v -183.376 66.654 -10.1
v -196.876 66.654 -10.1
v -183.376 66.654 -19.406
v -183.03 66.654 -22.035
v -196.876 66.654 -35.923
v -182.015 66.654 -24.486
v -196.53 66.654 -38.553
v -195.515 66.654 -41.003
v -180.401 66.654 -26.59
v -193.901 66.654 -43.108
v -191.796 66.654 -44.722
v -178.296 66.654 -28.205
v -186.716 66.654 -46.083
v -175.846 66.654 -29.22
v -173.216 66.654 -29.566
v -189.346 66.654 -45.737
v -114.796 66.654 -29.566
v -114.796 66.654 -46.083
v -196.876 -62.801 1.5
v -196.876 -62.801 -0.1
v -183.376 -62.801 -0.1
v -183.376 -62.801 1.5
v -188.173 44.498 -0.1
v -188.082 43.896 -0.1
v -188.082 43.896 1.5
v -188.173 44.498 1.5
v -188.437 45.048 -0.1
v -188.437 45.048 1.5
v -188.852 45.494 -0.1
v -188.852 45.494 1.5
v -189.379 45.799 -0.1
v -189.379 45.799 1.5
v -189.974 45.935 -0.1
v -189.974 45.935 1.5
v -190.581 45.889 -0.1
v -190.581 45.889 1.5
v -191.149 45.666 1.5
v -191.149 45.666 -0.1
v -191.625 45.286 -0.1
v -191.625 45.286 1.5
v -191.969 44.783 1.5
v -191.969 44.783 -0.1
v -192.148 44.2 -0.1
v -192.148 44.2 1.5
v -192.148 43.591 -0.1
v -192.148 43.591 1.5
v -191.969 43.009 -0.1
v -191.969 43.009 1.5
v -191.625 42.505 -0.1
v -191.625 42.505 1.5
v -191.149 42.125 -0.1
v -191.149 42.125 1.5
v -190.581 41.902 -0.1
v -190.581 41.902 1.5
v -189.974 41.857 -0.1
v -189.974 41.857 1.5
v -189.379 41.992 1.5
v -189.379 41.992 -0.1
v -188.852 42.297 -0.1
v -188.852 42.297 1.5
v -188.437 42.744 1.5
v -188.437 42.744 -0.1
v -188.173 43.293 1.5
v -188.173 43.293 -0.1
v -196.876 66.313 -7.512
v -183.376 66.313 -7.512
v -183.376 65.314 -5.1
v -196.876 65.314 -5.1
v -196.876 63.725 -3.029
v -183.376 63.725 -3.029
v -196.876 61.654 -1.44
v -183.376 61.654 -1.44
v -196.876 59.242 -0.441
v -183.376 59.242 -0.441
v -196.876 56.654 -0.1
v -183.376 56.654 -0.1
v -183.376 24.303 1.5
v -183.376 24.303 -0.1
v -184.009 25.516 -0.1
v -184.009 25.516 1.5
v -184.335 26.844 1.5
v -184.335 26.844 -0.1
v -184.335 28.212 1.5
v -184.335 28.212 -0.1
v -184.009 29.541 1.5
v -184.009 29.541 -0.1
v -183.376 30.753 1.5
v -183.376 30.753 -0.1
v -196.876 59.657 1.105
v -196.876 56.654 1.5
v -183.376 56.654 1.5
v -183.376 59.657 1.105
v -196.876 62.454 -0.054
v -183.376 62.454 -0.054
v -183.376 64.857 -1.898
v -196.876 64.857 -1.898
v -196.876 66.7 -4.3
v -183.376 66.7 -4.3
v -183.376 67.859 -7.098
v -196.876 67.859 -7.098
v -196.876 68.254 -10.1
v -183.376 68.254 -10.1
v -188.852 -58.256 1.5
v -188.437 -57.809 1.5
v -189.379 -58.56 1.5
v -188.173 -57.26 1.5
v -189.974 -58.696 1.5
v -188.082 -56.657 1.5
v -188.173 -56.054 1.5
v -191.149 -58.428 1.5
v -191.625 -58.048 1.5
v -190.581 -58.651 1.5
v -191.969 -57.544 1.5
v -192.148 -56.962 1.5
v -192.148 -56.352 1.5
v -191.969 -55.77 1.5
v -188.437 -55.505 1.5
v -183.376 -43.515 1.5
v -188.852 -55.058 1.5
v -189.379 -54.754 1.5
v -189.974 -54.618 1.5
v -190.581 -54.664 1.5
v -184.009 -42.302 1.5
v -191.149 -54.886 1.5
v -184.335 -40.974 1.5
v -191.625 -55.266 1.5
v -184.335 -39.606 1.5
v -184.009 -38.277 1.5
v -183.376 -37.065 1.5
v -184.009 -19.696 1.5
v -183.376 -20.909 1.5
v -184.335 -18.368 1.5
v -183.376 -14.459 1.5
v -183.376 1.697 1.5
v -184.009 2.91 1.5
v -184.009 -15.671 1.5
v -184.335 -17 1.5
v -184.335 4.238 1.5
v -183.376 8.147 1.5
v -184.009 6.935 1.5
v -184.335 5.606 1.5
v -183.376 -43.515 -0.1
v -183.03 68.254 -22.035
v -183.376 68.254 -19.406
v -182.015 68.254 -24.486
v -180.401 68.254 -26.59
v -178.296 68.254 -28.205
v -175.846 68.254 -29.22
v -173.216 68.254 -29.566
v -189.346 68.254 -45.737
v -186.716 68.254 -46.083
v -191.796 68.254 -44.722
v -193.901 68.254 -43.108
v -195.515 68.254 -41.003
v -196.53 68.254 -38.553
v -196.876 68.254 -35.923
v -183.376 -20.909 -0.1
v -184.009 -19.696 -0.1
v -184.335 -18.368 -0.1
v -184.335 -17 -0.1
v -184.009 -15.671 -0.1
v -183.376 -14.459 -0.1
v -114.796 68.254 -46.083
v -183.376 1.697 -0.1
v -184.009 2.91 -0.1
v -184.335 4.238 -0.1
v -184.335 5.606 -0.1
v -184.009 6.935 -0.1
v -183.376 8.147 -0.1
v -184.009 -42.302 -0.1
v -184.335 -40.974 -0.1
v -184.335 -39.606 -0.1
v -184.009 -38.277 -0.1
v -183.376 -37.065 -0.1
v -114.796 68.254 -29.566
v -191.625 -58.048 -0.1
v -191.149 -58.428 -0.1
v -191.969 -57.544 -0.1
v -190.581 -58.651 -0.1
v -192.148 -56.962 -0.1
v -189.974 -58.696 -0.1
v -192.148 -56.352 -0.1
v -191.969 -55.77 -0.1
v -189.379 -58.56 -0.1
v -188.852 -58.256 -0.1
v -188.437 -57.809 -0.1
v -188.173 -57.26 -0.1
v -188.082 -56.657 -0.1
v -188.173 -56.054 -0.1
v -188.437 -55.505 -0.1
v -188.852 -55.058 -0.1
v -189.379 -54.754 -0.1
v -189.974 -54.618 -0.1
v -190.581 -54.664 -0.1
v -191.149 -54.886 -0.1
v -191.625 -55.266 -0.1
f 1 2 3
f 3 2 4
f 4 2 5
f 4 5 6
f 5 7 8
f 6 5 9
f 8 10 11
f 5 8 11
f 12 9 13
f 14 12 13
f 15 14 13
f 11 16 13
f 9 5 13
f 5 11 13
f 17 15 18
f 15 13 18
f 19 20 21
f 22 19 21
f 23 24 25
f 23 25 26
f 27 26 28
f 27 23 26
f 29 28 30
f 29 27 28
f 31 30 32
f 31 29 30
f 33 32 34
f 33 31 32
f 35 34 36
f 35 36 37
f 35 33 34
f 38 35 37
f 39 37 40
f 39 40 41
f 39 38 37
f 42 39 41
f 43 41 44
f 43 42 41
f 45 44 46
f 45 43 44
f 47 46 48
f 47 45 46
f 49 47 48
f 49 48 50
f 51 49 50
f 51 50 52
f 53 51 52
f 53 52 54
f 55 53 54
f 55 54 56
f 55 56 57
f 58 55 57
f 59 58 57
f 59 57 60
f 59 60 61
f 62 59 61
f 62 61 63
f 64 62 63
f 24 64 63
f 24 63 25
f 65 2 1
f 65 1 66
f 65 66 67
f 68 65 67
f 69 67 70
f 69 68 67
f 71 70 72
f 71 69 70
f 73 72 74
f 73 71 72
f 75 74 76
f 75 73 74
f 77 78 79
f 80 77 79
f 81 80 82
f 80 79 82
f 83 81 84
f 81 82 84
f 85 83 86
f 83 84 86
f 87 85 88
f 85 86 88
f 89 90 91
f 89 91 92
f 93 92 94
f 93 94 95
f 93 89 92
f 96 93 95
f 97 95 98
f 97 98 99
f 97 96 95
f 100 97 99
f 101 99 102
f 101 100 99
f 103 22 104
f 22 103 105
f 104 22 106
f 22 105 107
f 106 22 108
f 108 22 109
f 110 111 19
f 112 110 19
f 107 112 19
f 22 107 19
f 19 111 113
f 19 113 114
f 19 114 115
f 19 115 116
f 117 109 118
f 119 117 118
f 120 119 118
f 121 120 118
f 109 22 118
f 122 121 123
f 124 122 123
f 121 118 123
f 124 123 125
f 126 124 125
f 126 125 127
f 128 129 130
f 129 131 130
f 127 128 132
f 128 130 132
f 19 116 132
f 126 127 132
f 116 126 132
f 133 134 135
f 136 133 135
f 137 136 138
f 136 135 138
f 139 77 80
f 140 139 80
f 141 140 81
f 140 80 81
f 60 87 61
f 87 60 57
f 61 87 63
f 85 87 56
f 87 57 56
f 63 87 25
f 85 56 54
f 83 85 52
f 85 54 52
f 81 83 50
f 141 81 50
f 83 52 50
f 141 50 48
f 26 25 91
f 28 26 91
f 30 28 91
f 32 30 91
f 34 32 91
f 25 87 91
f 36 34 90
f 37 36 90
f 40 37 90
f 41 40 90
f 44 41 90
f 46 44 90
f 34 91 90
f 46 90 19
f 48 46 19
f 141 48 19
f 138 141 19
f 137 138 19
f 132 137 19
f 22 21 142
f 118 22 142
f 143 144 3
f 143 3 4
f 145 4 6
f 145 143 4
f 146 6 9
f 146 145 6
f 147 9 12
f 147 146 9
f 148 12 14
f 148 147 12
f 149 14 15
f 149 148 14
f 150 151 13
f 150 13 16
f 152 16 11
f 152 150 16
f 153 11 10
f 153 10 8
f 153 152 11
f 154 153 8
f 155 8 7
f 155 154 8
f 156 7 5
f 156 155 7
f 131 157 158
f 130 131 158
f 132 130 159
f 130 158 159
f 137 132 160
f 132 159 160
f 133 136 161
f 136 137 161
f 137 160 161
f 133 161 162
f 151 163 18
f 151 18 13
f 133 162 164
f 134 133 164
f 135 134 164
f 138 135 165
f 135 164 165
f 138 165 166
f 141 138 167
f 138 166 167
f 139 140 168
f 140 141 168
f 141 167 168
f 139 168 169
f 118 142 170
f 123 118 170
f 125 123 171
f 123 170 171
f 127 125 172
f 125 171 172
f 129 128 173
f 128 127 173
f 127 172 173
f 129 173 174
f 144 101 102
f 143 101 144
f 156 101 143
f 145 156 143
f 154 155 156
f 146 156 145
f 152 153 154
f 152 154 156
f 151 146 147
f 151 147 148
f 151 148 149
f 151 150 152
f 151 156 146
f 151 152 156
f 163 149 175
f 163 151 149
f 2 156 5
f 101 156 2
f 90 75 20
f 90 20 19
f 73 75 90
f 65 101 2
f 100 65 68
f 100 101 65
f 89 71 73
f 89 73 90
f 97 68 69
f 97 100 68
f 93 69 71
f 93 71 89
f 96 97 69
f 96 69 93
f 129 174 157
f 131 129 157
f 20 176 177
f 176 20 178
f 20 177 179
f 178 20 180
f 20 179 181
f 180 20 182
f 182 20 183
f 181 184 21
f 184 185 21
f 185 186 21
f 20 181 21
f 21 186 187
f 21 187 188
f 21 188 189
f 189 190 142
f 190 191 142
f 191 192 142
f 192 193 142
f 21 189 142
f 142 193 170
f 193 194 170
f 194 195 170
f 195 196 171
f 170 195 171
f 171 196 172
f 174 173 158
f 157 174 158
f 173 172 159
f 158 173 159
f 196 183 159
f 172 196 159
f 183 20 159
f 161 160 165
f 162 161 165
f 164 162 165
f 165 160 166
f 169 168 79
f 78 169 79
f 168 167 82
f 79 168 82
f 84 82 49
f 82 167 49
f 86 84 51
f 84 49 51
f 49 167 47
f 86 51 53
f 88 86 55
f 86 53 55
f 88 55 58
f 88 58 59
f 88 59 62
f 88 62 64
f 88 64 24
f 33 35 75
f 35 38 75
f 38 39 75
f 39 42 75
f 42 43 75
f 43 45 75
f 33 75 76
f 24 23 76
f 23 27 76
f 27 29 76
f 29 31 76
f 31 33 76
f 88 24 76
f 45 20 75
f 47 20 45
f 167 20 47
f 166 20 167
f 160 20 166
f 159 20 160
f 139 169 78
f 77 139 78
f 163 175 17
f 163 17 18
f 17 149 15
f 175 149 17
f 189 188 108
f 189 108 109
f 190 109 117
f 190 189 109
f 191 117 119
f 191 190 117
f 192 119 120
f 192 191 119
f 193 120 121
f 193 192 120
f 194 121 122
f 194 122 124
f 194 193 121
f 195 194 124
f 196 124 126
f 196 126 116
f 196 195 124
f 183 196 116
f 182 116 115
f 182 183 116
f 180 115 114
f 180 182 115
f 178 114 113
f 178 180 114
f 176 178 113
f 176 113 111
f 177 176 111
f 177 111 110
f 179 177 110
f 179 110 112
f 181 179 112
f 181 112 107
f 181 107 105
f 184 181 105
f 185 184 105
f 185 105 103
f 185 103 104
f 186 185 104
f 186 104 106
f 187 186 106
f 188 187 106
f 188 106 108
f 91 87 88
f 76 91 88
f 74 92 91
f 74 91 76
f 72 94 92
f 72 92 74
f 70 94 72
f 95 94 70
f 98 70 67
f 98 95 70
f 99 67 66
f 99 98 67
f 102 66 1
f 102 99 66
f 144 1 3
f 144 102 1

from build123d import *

# Parameters (mm, degrees)
SKETCH1_R                    = 2.0447
BOSS_EXTRUDE1_DEPTH          = 1.5
CONVERT_SOLID1_START         = -0.100000102
CONVERT_SOLID1_OUTLINE_R     = 2.0447
CONVERT_SOLID1_DEPTH         = 0.100000102
EDGE_FLANGE1_STRIP_W         = 26.400000408
EDGE_FLANGE1_STRIP_H         = 1.600000102
EDGE_FLANGE1_STRIP_CUT_DEPTH = 13.5
EDGE_FLANGE1_DEPTH           = 13.5
EDGE_FLANGE1_FLAT_DEPTH      = 1.600000102
CUT_EXTRUDE1_DEPTH           = 241.95509557
CUT_EXTRUDE1_DEPTH_BACK      = 3.81
SKETCH14_R                   = 6.583720687


# Read off the part's stored shape, not the designer's step: Convert-Solid1
# Sheet-metal steps are written as plain solids
with BuildPart() as part:
    # Sketch1 → Boss-Extrude1 (new body)
    with BuildSketch(Plane.XY):
        with BuildLine():
            Line((-183.376451986, -43.514598677), (-183.376451986, -62.800541688))
            Line((-183.376451986, -62.800541688), (-196.876451986, -62.800541688))
            Line((-196.876451986, -62.800541688), (-196.876451986, 68.254211442))
            Line((-196.876451986, 68.254211442), (-183.376451986, 68.254211442))
            Line((-183.376451986, 68.254211442), (-183.376451986, 47.120607659))
            Line((-183.376451986, 47.120607659), (-183.376451986, 40.670801349))
            Line((-183.376451986, 40.670801349), (-183.376451986, 30.753207577))
            ThreePointArc((-183.376451986, 30.753207577), (-184.376452018, 27.528304422), (-183.376451986, 24.303401267))
            Line((-183.376451986, 24.303401267), (-183.376451986, 8.147207521))
            ThreePointArc((-183.376451986, 8.147207521), (-184.376451986, 4.922304422), (-183.376451986, 1.697401323))
            Line((-183.376451986, 1.697401323), (-183.376451986, -14.458792479))
            ThreePointArc((-183.376451986, -14.458792479), (-184.376451986, -17.683695578), (-183.376451986, -20.908598677))
            Line((-183.376451986, -20.908598677), (-183.376451986, -37.064792479))
            ThreePointArc((-183.376451986, -37.064792479), (-184.376451986, -40.289695578), (-183.376451986, -43.514598677))
        make_face()
        with Locations((-190.126451986, -56.65709566)):
            Circle(SKETCH1_R, mode=Mode.SUBTRACT)
        with Locations((-190.126451986, 43.895704504)):
            Circle(SKETCH1_R, mode=Mode.SUBTRACT)
    extrude(amount=BOSS_EXTRUDE1_DEPTH)

    # Convert-Solid1 outline → Convert-Solid1 (add)
    with BuildSketch(Plane.XY.offset(CONVERT_SOLID1_START)):
        with BuildLine():
            Line((-183.376451986, -62.800541688), (-183.376451986, -43.514598677))
            ThreePointArc((-183.376451986, -43.514598677), (-184.376451986, -40.289695578), (-183.376451986, -37.064792479))
            Line((-183.376451986, -37.064792479), (-183.376451986, -20.908598677))
            ThreePointArc((-183.376451986, -20.908598677), (-184.376451986, -17.683695578), (-183.376451986, -14.458792479))
            Line((-183.376451986, -14.458792479), (-183.376451986, 1.697401323))
            ThreePointArc((-183.376451986, 1.697401323), (-184.376451986, 4.922304422), (-183.376451986, 8.147207521))
            Line((-183.376451986, 8.147207521), (-183.376451986, 24.303401267))
            ThreePointArc((-183.376451986, 24.303401267), (-184.376452018, 27.528304422), (-183.376451986, 30.753207577))
            Line((-183.376451986, 30.753207577), (-183.376451986, 68.254211442))
            Line((-183.376451986, 68.254211442), (-196.876451986, 68.254211442))
            Line((-196.876451986, 68.254211442), (-196.876451986, -62.800541688))
            Line((-196.876451986, -62.800541688), (-183.376451986, -62.800541688))
        make_face()
        with Locations((-190.126451986, -56.65709566)):
            Circle(CONVERT_SOLID1_OUTLINE_R, mode=Mode.SUBTRACT)
        with Locations((-190.126451986, 43.895704504)):
            Circle(CONVERT_SOLID1_OUTLINE_R, mode=Mode.SUBTRACT)
    extrude(amount=CONVERT_SOLID1_DEPTH)

    # Edge-Flange1 strip (across the edge) → Edge-Flange1 strip cut (cut)
    with BuildSketch(Plane(origin=(-196.876451986, 68.254211442, -0.100000102), x_dir=(0, -1, 0), z_dir=(1, 0, 0))):
        with Locations((-1.600000102, -0.800000051)):
            Rectangle(EDGE_FLANGE1_STRIP_W, EDGE_FLANGE1_STRIP_H)
    extrude(amount=EDGE_FLANGE1_STRIP_CUT_DEPTH, mode=Mode.SUBTRACT)

    # Edge-Flange1 bend section (across the edge) → Edge-Flange1 (add)
    with BuildSketch(Plane(origin=(-196.876451986, 68.254211442, -0.100000102), x_dir=(0, -1, 0), z_dir=(1, 0, 0))):
        with BuildLine():
            Line((0, 10), (1.600000102, 10))
            ThreePointArc((1.600000102, 10), (4.52893229, 2.928932188), (11.600000102, 0))
            Line((11.600000102, 0), (11.600000102, -1.600000102))
            ThreePointArc((11.600000102, -1.600000102), (3.397561368, 1.797561266), (0, 10))
        make_face()
    extrude(amount=EDGE_FLANGE1_DEPTH)

    # Edge-Flange1 profile (on flange) → Edge-Flange1 flat (add)
    with BuildSketch(Plane(origin=(0, 68.254211442, -0.100000102), x_dir=(1, 0, 0), z_dir=(0, 1, 0))):
        with BuildLine():
            Line((-196.876451986, 10), (-183.376451986, 10))
            Line((-183.376451986, 10), (-183.376451986, 19.305702381))
            ThreePointArc((-183.376451986, 19.305702381), (-180.400656883, 26.489907277), (-173.216451986, 29.465702381))
            Line((-173.216451986, 29.465702381), (-114.796451986, 29.465702381))
            Line((-114.796451986, 29.465702381), (-114.796451986, 45.983320267))
            Line((-114.796451986, 45.983320267), (-175.756451986, 45.983320267))
            Line((-175.756451986, 45.983320267), (-186.716451986, 45.983320267))
            ThreePointArc((-186.716451986, 45.983320267), (-193.900656883, 43.007525164), (-196.876451986, 35.823320267))
            Line((-196.876451986, 35.823320267), (-196.876451986, 10))
        make_face()
    extrude(amount=-EDGE_FLANGE1_FLAT_DEPTH)

    # Sketch14 → Cut-Extrude1 (cut, two sides: drawn at the far end of the back side and taken through both)
    with BuildSketch(Plane(origin=(0, 68.254211442, 0), x_dir=(1, 0, 0), z_dir=(0, 1, 0)).offset(-CUT_EXTRUDE1_DEPTH_BACK)):
        with Locations((-99.147079888, 65.798432199)):
            Circle(SKETCH14_R)
    extrude(amount=CUT_EXTRUDE1_DEPTH + CUT_EXTRUDE1_DEPTH_BACK, mode=Mode.SUBTRACT)


solid = part.part
